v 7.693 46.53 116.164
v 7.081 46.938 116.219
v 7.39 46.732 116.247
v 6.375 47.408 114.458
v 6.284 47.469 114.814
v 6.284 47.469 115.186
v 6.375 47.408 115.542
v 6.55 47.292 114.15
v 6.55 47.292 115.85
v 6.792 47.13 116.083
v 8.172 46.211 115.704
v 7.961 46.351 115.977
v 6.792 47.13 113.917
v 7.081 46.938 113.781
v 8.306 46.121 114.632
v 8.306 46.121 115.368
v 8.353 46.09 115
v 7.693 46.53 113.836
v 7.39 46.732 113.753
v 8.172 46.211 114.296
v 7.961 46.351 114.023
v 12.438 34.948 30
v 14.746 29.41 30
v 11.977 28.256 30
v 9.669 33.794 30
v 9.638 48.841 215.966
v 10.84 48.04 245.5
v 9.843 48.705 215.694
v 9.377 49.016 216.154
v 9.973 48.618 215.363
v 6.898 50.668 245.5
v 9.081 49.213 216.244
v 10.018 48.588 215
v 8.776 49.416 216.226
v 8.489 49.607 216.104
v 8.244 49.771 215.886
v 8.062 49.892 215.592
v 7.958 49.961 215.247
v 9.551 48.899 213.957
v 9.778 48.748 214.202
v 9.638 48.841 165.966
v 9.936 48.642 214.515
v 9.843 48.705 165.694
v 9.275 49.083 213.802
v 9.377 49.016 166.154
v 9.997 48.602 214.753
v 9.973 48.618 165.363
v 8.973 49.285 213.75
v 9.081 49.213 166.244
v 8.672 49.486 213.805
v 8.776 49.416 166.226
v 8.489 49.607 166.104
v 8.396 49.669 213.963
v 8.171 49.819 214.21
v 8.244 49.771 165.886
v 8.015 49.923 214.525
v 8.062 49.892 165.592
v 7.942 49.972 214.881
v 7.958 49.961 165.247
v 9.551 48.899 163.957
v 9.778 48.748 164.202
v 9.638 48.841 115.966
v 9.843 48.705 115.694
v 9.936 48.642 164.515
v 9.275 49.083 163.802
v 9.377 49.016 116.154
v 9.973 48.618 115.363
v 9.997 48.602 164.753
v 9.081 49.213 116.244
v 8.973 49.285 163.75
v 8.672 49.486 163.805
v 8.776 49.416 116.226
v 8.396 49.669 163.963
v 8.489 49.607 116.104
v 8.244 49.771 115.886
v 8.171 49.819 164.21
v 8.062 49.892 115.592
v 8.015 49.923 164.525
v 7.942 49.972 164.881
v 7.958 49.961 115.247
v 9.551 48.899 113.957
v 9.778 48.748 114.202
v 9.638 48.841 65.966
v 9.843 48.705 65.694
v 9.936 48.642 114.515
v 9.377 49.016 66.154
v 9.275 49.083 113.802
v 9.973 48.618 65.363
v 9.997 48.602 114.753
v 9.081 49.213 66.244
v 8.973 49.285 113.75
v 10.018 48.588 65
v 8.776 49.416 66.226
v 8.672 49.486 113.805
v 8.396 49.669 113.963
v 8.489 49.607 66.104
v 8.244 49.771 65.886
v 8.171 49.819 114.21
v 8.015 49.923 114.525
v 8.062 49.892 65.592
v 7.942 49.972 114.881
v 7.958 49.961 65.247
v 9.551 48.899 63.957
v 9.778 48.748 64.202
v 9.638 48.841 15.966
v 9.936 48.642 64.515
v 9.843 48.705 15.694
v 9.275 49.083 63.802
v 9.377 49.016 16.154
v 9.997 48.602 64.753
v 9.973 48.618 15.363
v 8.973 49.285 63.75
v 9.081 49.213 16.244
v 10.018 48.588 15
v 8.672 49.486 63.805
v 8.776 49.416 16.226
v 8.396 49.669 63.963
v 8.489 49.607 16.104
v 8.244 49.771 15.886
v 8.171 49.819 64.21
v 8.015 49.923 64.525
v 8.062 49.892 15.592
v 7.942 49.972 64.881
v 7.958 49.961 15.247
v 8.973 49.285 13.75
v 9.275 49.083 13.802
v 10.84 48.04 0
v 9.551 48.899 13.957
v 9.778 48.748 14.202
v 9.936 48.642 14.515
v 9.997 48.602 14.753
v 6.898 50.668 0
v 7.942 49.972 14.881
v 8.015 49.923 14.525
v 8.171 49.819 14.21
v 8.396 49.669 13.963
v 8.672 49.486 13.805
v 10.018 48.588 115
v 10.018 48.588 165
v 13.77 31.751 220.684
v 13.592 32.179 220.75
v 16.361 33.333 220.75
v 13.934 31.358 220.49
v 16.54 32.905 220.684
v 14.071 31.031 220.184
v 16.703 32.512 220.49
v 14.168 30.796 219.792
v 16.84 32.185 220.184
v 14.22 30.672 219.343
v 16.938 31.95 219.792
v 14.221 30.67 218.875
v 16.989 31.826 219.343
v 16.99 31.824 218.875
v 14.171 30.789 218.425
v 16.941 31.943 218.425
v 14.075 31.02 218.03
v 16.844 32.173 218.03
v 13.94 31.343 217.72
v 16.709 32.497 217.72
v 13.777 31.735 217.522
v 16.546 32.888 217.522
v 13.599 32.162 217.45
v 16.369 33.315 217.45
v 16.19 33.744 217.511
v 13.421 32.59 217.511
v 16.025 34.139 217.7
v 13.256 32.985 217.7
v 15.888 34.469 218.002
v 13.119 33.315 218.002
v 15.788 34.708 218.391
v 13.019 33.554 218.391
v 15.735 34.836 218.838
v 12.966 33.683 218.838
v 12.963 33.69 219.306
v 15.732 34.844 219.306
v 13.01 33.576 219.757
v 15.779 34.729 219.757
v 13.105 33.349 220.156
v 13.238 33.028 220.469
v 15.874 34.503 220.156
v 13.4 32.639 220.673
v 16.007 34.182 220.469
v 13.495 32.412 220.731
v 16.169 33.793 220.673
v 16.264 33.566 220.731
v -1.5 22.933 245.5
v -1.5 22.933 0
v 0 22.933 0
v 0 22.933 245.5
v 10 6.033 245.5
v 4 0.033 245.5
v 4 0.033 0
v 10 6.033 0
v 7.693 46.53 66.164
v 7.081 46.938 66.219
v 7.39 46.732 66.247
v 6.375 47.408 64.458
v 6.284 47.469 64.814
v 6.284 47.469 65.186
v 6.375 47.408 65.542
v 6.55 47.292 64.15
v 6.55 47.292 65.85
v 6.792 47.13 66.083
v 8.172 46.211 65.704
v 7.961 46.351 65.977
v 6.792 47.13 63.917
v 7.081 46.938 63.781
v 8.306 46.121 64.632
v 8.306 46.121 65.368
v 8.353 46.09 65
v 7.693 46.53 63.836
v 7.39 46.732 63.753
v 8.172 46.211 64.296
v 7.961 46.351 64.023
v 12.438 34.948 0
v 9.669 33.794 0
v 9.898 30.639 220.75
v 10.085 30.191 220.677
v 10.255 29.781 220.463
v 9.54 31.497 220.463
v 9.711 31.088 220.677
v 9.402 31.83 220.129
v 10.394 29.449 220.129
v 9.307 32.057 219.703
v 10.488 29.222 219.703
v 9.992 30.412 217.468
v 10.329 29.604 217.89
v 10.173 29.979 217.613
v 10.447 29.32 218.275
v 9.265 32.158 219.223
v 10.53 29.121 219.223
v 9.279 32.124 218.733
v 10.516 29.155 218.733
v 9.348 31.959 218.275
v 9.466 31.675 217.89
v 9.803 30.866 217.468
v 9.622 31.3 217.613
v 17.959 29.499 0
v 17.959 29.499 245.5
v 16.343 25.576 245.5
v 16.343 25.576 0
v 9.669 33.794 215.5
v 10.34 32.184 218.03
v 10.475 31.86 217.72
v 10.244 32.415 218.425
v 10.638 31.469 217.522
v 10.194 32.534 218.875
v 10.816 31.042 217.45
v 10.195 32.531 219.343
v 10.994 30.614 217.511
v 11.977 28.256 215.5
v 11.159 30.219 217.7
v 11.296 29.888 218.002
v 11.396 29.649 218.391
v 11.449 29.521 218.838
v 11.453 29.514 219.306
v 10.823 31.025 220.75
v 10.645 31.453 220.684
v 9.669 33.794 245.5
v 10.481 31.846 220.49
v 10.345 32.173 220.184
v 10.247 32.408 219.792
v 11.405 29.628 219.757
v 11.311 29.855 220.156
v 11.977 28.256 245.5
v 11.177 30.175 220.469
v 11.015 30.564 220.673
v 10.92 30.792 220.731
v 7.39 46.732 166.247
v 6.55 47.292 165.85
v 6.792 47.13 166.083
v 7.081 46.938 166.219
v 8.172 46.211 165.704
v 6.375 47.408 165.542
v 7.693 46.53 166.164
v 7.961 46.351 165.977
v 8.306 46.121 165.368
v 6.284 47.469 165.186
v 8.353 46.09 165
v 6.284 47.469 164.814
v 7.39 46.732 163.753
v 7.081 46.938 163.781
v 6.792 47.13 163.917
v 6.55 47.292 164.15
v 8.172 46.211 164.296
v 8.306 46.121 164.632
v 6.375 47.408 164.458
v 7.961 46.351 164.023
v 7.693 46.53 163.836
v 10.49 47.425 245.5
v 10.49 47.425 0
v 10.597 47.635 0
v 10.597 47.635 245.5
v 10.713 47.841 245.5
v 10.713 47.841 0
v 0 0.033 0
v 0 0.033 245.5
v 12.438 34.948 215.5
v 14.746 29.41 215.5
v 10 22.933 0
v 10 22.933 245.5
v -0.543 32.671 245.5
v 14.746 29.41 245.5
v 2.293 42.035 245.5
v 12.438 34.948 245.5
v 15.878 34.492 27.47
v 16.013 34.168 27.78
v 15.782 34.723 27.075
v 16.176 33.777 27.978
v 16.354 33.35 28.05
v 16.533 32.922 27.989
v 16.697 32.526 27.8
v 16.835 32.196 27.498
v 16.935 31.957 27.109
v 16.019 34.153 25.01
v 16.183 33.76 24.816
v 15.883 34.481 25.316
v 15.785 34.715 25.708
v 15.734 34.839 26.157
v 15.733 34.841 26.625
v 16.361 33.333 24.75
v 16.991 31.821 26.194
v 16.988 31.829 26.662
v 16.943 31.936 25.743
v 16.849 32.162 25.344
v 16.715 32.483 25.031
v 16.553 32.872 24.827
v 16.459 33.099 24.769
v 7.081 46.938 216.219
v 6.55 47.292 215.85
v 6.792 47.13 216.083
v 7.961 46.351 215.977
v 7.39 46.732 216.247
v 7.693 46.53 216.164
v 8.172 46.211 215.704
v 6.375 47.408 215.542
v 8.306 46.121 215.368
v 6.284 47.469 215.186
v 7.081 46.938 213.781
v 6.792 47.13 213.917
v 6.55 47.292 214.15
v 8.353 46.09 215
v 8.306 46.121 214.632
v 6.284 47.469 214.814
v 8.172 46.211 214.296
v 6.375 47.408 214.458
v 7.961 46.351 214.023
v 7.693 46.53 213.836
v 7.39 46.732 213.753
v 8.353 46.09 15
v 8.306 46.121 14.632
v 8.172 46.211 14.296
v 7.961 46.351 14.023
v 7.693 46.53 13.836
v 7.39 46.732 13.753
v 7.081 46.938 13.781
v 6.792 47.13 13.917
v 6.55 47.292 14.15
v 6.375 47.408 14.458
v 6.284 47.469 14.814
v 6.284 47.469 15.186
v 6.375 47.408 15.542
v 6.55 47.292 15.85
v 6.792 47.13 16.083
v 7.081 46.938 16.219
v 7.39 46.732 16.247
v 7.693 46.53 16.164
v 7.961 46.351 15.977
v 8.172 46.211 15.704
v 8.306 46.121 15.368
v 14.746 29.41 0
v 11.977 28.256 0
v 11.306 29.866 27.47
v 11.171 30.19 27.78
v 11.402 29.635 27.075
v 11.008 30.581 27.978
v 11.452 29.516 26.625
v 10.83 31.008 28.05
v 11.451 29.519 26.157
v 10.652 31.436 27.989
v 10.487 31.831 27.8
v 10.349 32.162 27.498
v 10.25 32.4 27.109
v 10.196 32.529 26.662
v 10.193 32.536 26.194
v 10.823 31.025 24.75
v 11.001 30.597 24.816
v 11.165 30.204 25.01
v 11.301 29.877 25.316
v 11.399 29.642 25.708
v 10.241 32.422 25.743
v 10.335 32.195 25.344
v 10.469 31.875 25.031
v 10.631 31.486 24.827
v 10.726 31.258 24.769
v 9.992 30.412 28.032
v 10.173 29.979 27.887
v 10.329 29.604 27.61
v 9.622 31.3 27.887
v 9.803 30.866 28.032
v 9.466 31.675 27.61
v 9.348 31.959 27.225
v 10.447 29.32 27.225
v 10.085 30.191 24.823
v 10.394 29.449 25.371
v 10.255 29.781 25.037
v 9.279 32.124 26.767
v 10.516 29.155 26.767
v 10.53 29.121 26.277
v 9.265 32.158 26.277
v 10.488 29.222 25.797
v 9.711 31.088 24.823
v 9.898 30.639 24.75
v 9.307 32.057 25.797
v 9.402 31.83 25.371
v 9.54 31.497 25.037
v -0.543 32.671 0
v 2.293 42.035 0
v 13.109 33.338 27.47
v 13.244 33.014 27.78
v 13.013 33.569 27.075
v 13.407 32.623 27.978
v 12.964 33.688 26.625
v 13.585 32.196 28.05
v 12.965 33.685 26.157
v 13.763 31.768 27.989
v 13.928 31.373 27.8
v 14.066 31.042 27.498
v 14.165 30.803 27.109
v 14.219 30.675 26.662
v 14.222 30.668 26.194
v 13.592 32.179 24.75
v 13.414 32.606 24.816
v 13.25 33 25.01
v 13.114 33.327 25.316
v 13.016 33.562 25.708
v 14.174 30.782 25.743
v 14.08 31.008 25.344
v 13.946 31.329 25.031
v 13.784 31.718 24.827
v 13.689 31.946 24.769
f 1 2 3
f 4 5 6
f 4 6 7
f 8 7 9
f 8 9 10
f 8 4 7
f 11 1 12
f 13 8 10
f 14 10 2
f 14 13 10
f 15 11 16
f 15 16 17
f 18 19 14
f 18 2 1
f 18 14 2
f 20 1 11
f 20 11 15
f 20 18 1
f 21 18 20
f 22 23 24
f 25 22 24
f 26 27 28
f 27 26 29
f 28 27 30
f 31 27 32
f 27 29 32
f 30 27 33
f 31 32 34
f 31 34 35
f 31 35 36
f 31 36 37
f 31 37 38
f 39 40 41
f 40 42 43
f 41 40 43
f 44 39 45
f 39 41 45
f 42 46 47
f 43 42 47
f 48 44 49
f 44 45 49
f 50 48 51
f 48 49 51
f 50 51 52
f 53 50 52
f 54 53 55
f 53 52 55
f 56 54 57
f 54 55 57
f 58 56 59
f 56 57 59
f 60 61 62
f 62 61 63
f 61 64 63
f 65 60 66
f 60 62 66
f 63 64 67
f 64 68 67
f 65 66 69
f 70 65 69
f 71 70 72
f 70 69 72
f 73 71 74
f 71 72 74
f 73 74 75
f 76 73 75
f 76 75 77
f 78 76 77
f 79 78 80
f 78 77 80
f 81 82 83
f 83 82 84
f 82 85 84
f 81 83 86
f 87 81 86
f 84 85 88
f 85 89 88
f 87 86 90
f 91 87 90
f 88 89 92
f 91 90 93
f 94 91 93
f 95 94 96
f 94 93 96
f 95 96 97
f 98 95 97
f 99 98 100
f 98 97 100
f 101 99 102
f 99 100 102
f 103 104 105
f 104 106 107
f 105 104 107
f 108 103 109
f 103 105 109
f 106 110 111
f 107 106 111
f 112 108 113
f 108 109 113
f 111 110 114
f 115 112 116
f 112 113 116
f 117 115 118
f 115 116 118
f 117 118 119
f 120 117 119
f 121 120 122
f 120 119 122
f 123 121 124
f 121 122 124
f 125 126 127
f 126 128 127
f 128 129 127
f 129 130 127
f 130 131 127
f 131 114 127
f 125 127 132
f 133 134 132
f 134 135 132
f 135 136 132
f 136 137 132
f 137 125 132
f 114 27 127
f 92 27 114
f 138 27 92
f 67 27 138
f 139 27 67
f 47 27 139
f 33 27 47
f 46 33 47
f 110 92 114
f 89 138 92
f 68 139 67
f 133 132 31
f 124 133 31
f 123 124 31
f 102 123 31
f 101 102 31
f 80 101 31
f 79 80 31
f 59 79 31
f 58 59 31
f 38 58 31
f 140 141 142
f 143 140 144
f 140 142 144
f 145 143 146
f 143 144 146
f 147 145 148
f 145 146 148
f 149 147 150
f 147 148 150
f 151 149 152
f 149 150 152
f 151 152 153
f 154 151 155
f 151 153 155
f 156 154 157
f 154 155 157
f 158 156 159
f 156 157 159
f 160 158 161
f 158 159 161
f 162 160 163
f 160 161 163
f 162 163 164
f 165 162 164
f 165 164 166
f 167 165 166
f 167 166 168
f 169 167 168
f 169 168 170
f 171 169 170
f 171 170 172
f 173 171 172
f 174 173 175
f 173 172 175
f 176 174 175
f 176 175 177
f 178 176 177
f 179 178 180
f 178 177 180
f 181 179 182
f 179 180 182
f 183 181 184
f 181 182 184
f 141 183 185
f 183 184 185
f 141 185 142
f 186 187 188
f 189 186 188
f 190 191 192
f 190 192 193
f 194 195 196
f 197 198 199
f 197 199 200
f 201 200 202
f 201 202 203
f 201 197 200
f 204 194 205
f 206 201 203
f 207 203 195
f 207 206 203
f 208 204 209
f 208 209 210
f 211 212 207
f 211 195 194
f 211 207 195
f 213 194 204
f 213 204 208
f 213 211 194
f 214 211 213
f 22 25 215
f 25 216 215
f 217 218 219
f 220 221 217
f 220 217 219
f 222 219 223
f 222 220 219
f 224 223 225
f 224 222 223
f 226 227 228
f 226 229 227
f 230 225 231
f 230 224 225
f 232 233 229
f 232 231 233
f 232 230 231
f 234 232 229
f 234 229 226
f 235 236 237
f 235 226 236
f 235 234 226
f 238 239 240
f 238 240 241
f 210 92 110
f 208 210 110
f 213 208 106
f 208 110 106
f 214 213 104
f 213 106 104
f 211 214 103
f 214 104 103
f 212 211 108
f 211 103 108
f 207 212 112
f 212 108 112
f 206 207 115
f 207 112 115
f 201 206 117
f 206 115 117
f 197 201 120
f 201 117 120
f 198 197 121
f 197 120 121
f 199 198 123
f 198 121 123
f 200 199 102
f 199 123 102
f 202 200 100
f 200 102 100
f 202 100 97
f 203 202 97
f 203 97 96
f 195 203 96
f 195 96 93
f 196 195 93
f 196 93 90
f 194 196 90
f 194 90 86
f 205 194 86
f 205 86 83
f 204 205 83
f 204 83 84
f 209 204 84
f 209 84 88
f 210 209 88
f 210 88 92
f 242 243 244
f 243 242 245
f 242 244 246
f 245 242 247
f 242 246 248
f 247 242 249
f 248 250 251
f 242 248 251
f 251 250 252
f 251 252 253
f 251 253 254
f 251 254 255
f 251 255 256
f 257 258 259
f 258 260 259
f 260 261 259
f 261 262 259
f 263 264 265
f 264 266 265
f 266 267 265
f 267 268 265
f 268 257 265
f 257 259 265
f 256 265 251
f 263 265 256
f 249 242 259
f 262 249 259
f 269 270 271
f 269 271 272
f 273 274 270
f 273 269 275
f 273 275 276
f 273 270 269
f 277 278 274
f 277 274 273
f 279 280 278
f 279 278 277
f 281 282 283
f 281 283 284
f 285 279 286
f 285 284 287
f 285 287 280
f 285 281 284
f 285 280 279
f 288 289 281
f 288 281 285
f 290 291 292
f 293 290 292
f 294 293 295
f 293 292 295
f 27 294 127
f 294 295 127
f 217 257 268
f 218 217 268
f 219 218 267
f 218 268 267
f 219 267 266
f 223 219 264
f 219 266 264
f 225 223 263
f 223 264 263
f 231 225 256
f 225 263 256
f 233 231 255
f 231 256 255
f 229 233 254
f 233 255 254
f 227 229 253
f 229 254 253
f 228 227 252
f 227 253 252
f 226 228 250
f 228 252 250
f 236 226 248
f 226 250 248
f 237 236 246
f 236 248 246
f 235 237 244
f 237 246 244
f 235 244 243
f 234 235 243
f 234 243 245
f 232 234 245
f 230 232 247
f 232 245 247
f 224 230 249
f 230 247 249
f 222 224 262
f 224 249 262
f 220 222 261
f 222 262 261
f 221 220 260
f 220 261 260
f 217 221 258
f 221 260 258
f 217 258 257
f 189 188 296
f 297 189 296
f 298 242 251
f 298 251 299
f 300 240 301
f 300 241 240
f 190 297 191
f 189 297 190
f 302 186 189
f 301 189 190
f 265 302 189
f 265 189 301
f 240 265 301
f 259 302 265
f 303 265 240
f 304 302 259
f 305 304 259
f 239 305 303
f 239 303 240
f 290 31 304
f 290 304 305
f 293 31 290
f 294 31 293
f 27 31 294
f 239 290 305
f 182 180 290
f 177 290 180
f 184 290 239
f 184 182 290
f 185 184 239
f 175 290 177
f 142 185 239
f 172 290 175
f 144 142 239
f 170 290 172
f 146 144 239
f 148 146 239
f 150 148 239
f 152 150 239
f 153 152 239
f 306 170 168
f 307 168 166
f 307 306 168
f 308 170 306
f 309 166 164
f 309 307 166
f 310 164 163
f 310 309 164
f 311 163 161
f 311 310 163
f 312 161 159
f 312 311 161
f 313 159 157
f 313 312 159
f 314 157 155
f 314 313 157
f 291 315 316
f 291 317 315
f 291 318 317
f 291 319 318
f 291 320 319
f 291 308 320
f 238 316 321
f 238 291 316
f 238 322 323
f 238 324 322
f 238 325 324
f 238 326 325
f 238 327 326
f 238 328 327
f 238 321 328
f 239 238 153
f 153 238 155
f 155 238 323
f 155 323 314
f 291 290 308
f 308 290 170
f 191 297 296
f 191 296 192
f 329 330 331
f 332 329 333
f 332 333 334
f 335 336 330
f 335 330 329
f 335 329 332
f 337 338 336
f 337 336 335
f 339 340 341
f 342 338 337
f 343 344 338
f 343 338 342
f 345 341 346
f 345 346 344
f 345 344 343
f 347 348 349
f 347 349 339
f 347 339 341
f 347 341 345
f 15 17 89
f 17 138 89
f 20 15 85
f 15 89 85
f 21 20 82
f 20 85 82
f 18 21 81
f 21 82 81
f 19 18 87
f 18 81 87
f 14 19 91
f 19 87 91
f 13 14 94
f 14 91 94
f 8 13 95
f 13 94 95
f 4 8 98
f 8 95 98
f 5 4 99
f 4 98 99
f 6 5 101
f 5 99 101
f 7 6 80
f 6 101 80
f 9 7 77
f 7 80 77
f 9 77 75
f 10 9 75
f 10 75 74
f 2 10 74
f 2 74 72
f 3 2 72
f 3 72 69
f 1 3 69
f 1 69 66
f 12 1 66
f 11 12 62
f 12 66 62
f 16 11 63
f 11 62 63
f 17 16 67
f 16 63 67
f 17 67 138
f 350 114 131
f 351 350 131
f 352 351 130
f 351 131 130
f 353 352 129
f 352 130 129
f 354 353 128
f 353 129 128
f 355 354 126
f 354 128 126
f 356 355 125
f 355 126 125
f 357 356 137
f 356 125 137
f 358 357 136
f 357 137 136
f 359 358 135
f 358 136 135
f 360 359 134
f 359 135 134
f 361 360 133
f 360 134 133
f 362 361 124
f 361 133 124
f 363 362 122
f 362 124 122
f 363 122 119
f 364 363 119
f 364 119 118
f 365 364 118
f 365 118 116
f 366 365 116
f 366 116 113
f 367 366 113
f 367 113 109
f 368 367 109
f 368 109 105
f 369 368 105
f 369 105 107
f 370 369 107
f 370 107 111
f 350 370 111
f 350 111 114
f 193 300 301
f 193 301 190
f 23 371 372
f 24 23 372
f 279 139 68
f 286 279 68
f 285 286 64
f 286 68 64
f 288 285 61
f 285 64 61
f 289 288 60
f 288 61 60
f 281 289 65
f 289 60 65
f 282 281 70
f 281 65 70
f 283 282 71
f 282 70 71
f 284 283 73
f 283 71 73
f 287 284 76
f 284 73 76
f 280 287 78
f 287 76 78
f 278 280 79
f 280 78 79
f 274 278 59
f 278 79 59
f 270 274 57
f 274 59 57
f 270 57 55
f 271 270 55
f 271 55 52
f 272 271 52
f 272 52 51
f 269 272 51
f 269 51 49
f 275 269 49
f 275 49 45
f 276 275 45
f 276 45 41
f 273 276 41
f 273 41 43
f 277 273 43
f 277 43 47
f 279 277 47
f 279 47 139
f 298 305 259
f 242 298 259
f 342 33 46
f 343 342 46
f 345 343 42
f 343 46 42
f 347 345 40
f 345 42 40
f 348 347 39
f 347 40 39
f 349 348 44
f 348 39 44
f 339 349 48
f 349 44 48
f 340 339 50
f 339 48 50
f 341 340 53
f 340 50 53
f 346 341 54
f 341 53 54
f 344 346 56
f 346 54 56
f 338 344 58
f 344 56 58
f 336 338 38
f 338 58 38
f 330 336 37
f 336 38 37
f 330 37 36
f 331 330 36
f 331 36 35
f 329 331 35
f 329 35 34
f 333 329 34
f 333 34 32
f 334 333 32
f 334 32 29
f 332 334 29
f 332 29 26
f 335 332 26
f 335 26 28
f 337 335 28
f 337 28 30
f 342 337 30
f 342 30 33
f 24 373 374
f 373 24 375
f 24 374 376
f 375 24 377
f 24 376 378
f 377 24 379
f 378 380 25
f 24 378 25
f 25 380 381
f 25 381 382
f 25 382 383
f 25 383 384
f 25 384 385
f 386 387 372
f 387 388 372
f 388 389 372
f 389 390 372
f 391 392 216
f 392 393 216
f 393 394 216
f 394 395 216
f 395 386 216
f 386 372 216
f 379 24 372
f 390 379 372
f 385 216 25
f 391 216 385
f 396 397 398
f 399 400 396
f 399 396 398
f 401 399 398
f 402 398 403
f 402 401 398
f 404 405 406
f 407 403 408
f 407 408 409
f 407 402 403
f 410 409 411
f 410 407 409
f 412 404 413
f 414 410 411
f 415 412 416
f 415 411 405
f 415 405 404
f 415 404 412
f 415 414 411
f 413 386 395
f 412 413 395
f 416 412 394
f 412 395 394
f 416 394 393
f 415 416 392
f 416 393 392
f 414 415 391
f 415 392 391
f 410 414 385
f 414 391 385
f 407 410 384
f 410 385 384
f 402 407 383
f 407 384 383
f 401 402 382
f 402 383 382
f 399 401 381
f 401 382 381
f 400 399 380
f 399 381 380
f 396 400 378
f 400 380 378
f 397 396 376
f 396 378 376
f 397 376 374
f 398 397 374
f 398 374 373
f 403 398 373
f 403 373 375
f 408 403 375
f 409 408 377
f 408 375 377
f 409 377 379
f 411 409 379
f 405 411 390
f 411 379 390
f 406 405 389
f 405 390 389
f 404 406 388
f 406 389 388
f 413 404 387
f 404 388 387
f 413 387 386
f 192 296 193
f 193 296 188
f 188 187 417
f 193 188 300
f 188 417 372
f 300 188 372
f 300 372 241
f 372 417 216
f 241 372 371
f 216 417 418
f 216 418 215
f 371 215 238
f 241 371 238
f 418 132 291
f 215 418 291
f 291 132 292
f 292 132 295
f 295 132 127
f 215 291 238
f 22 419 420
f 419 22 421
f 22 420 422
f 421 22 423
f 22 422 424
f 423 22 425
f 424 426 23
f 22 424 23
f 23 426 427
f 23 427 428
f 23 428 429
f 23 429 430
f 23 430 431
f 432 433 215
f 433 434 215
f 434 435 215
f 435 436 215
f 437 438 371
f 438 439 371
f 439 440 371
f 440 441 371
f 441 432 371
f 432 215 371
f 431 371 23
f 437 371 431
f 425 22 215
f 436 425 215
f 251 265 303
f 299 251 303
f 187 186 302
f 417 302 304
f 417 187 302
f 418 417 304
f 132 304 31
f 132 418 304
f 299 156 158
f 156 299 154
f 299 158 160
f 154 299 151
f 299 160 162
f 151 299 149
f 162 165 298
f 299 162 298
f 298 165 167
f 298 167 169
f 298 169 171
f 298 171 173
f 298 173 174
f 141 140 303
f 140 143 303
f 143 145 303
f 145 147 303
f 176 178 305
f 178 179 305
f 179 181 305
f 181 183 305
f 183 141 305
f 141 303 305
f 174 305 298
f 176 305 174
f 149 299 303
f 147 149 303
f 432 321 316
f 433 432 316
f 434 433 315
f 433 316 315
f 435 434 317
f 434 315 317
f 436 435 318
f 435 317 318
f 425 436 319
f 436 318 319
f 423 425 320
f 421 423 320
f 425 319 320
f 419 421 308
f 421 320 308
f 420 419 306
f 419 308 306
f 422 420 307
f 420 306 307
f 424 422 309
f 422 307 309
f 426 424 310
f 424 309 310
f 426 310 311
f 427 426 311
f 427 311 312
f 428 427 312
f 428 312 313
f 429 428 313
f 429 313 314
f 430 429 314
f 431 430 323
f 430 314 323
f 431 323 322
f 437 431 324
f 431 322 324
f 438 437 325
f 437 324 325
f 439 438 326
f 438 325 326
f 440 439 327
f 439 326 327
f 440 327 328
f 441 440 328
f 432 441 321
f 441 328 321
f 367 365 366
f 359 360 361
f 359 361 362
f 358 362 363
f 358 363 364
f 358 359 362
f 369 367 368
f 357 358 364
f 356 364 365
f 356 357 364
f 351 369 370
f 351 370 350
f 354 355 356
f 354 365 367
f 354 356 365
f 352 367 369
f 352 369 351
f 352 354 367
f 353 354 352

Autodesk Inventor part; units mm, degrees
ref_plane "YZ Plane" through (0, 0, 0) normal (1, 0, 0) x (0, 1, 0)
ref_plane "Work Plane1" through (0, 0, 0) normal (0, 0, 1) x (1, 0, 0)
sketch "Sketch1" plane through (0, 0, 0) normal (0, 0, 1) x (1, 0, 0)
  line L0 (10, 0) -> (-1.5, 0) projected
  line L1 (10, 45.2667) -> (10, 0) projected
  arc A0 (13.0769, 49.8821) -> (10, 45.2667) centre (15, 45.2667) ccw projected
  line L2 (54.8615, 67.2923) -> (13.0769, 49.8821) projected
  line L3 (50.4385, 77.9077) -> (54.8615, 67.2923) projected
  line L4 (50.4385, 77.9077) -> (29.2692, 69.0872) projected
  arc A1 (29.2692, 69.0872) -> (-1.5, 22.9333) centre (48.5, 22.9333) ccw projected
  line L5 (-1.5, 0) -> (-1.5, 22.9333) projected
  line L6 (15, 45.2667) -> (6.8975, 50.6683)
  line L7 (10, 48.6) -> (19.7692, 25.1538) projected
  line L8 (35.4, 31.6667) -> (10, 21.0833) projected
  line L9 (19.1124, 26.7302) -> (10, 22.9333)
  line L10 (-1.5, 22.9333) -> (10, 22.9333)
  line L11 (-1.5, 22.9333) -> (0, 22.9333)
  line L12 (0, 22.9333) -> (0, -23.4445)
  line L13 (0, -23.4445) -> (-1.5, -23.4445)
  line L14 (-1.5, -23.4445) -> (-1.5, 22.9333)
  line L15 (0, 0.0333) -> (4, 0.0333)
  line L16 (4, 0.0333) -> (10, 6.0333)
  point P0 (0, 0)
  point P1 (10.4897, 47.4247)
  point P2 (10.8397, 48.0402)
  point P3 (10, 48.6)
  point P4 (0, 22.9333)
  dimension "d3" = 1.5
  dimension "d4" = 4
  dimension "d5" = 45
  dimension "d6" = 22.9
extrude "Extrusion1" add sketch "Sketch1" along normal blind 245.5 contours L16 L15 L12 L10 L1 | A1 L6 L7 A0 L1 L10 | L1 A0 L7 L9 | L6 A0 L7
sketch "Sketch2" plane through (6.8975, 50.6683, 245.5) normal (0.5547, 0.8321, 0) x (0.8321, -0.5547, 0)
  line L0 (4.738, 245.5) -> (0, 245.5) projected
  line L1 (0, 245.5) -> (0, 0) projected
  line L2 (4.738, 0) -> (0, 0) projected
  line L3 (4.738, 245.5) -> (4.738, 0) projected
  circle A0 centre (2.5, 230.5) radius 1.25
  circle A1 centre (2.5, 180.5) radius 1.25
  circle A2 centre (2.5, 130.5) radius 1.25
  circle A3 centre (2.5, 80.5) radius 1.25
  circle A4 centre (2.5, 30.5) radius 1.25
  point P0 (22.3667, 245.5)
  dimension "d7" = 2.5
  dimension "d8" = 2.5
  dimension "d9" = 15
  dimension "d12" = 50
extrude "Extrusion2" cut sketch "Sketch2" against normal blind 3 contours A0 | A1 | A2 | A3 | A4
sketch "Sketch3" plane through (0, 0, 0) normal (0, 0, -1) x (-1, 0, 0)
  line L0 (-10, 6.0333) -> (-10, 22.9333) projected
  line L1 (-4, 0.0333) -> (-10, 6.0333) projected
  line L2 (0, 0.0333) -> (-4, 0.0333) projected
  line L3 (0, 22.9333) -> (0, 0.0333) projected
  line L4 (1.5, 22.9333) -> (0, 22.9333) projected
  arc A0 (1.5, 22.9333) -> (-6.8975, 50.6683) centre (-48.5, 22.9333) ccw projected
  line L5 (-10.8397, 48.0402) -> (-6.8975, 50.6683) projected
  arc A1 (-10.4897, 47.4247) -> (-10.8397, 48.0402) centre (-15, 45.2667) ccw projected
  line L6 (-19.1124, 26.7302) -> (-10.4897, 47.4247) projected
  line L7 (-10, 22.9333) -> (-19.1124, 26.7302) projected
  line L8 (-12.4384, 34.9479) -> (-14.7461, 29.4095)
  line L9 (-14.7461, 29.4095) -> (-11.9768, 28.2556)
  line L10 (-11.9768, 28.2556) -> (-9.6691, 33.7941)
  line L11 (-9.6691, 33.7941) -> (-12.4384, 34.9479)
  point P0 (0, 0)
  dimension "d19" = 12.7
  dimension "d20" = 6
  dimension "d21" = 3
  dimension "d22" = 3
extrude "Extrusion3" cut sketch "Sketch3" against normal blind 30 contours L11 L10 L9 L8
sketch "Sketch4" plane through (10.4897, 47.4247, 245.5) normal (0.9231, 0.3846, 0) x (0, 0, -1)
  line L0 (245.5, -22.4191) -> (245.5, 0) projected
  line L1 (245.5, 0) -> (0, 0) projected
  line L2 (0, -22.4191) -> (0, 0) projected
  line L3 (245.5, -22.4191) -> (0, -22.4191) projected
  line L4 (245.5, -18.2665) -> (245.5, -12.2665) construction
  line L5 (245.5, -18.2665) -> (215.5, -18.2665) projected
  line L6 (215.5, -18.2665) -> (215.5, -12.2665) projected
  line L7 (245.5, -12.2665) -> (215.5, -12.2665) projected
  circle A0 centre (219.1, -15.2665) radius 1.65
  line L8 (220.7743, -18.1665) -> (217.4257, -18.1665)
  line L9 (217.4257, -18.1665) -> (215.7514, -15.2665)
  line L10 (215.7514, -15.2665) -> (217.4257, -12.3665)
  line L11 (217.4257, -12.3665) -> (220.7743, -12.3665)
  line L12 (220.7743, -12.3665) -> (222.4486, -15.2665)
  line L13 (222.4486, -15.2665) -> (220.7743, -18.1665)
  point P0 (245.5, -39.7422)
  point P1 (215.5, -15.2665)
  dimension "d25" = 3.3
  dimension "d26" = 3.6
  dimension "d27" = 5.8
extrude "Extrusion4" cut sketch "Sketch4" against normal blind 7 contours A0
ref_plane "Work Plane2" through (0, 0, 122.75) normal (0, 0, 1) x (1, 0, 0)
mirror "Mirror1" about plane through (0, 0, 122.75) normal (0, 0, 1) of "Extrusion4", "Extrusion3"
chamfer "Chamfer1" distance 3 angle 45 1 edges at (19.1124, 26.7302, 122.75)
properties part number "ESQUINA_REDONDEADA_R50_P2"
